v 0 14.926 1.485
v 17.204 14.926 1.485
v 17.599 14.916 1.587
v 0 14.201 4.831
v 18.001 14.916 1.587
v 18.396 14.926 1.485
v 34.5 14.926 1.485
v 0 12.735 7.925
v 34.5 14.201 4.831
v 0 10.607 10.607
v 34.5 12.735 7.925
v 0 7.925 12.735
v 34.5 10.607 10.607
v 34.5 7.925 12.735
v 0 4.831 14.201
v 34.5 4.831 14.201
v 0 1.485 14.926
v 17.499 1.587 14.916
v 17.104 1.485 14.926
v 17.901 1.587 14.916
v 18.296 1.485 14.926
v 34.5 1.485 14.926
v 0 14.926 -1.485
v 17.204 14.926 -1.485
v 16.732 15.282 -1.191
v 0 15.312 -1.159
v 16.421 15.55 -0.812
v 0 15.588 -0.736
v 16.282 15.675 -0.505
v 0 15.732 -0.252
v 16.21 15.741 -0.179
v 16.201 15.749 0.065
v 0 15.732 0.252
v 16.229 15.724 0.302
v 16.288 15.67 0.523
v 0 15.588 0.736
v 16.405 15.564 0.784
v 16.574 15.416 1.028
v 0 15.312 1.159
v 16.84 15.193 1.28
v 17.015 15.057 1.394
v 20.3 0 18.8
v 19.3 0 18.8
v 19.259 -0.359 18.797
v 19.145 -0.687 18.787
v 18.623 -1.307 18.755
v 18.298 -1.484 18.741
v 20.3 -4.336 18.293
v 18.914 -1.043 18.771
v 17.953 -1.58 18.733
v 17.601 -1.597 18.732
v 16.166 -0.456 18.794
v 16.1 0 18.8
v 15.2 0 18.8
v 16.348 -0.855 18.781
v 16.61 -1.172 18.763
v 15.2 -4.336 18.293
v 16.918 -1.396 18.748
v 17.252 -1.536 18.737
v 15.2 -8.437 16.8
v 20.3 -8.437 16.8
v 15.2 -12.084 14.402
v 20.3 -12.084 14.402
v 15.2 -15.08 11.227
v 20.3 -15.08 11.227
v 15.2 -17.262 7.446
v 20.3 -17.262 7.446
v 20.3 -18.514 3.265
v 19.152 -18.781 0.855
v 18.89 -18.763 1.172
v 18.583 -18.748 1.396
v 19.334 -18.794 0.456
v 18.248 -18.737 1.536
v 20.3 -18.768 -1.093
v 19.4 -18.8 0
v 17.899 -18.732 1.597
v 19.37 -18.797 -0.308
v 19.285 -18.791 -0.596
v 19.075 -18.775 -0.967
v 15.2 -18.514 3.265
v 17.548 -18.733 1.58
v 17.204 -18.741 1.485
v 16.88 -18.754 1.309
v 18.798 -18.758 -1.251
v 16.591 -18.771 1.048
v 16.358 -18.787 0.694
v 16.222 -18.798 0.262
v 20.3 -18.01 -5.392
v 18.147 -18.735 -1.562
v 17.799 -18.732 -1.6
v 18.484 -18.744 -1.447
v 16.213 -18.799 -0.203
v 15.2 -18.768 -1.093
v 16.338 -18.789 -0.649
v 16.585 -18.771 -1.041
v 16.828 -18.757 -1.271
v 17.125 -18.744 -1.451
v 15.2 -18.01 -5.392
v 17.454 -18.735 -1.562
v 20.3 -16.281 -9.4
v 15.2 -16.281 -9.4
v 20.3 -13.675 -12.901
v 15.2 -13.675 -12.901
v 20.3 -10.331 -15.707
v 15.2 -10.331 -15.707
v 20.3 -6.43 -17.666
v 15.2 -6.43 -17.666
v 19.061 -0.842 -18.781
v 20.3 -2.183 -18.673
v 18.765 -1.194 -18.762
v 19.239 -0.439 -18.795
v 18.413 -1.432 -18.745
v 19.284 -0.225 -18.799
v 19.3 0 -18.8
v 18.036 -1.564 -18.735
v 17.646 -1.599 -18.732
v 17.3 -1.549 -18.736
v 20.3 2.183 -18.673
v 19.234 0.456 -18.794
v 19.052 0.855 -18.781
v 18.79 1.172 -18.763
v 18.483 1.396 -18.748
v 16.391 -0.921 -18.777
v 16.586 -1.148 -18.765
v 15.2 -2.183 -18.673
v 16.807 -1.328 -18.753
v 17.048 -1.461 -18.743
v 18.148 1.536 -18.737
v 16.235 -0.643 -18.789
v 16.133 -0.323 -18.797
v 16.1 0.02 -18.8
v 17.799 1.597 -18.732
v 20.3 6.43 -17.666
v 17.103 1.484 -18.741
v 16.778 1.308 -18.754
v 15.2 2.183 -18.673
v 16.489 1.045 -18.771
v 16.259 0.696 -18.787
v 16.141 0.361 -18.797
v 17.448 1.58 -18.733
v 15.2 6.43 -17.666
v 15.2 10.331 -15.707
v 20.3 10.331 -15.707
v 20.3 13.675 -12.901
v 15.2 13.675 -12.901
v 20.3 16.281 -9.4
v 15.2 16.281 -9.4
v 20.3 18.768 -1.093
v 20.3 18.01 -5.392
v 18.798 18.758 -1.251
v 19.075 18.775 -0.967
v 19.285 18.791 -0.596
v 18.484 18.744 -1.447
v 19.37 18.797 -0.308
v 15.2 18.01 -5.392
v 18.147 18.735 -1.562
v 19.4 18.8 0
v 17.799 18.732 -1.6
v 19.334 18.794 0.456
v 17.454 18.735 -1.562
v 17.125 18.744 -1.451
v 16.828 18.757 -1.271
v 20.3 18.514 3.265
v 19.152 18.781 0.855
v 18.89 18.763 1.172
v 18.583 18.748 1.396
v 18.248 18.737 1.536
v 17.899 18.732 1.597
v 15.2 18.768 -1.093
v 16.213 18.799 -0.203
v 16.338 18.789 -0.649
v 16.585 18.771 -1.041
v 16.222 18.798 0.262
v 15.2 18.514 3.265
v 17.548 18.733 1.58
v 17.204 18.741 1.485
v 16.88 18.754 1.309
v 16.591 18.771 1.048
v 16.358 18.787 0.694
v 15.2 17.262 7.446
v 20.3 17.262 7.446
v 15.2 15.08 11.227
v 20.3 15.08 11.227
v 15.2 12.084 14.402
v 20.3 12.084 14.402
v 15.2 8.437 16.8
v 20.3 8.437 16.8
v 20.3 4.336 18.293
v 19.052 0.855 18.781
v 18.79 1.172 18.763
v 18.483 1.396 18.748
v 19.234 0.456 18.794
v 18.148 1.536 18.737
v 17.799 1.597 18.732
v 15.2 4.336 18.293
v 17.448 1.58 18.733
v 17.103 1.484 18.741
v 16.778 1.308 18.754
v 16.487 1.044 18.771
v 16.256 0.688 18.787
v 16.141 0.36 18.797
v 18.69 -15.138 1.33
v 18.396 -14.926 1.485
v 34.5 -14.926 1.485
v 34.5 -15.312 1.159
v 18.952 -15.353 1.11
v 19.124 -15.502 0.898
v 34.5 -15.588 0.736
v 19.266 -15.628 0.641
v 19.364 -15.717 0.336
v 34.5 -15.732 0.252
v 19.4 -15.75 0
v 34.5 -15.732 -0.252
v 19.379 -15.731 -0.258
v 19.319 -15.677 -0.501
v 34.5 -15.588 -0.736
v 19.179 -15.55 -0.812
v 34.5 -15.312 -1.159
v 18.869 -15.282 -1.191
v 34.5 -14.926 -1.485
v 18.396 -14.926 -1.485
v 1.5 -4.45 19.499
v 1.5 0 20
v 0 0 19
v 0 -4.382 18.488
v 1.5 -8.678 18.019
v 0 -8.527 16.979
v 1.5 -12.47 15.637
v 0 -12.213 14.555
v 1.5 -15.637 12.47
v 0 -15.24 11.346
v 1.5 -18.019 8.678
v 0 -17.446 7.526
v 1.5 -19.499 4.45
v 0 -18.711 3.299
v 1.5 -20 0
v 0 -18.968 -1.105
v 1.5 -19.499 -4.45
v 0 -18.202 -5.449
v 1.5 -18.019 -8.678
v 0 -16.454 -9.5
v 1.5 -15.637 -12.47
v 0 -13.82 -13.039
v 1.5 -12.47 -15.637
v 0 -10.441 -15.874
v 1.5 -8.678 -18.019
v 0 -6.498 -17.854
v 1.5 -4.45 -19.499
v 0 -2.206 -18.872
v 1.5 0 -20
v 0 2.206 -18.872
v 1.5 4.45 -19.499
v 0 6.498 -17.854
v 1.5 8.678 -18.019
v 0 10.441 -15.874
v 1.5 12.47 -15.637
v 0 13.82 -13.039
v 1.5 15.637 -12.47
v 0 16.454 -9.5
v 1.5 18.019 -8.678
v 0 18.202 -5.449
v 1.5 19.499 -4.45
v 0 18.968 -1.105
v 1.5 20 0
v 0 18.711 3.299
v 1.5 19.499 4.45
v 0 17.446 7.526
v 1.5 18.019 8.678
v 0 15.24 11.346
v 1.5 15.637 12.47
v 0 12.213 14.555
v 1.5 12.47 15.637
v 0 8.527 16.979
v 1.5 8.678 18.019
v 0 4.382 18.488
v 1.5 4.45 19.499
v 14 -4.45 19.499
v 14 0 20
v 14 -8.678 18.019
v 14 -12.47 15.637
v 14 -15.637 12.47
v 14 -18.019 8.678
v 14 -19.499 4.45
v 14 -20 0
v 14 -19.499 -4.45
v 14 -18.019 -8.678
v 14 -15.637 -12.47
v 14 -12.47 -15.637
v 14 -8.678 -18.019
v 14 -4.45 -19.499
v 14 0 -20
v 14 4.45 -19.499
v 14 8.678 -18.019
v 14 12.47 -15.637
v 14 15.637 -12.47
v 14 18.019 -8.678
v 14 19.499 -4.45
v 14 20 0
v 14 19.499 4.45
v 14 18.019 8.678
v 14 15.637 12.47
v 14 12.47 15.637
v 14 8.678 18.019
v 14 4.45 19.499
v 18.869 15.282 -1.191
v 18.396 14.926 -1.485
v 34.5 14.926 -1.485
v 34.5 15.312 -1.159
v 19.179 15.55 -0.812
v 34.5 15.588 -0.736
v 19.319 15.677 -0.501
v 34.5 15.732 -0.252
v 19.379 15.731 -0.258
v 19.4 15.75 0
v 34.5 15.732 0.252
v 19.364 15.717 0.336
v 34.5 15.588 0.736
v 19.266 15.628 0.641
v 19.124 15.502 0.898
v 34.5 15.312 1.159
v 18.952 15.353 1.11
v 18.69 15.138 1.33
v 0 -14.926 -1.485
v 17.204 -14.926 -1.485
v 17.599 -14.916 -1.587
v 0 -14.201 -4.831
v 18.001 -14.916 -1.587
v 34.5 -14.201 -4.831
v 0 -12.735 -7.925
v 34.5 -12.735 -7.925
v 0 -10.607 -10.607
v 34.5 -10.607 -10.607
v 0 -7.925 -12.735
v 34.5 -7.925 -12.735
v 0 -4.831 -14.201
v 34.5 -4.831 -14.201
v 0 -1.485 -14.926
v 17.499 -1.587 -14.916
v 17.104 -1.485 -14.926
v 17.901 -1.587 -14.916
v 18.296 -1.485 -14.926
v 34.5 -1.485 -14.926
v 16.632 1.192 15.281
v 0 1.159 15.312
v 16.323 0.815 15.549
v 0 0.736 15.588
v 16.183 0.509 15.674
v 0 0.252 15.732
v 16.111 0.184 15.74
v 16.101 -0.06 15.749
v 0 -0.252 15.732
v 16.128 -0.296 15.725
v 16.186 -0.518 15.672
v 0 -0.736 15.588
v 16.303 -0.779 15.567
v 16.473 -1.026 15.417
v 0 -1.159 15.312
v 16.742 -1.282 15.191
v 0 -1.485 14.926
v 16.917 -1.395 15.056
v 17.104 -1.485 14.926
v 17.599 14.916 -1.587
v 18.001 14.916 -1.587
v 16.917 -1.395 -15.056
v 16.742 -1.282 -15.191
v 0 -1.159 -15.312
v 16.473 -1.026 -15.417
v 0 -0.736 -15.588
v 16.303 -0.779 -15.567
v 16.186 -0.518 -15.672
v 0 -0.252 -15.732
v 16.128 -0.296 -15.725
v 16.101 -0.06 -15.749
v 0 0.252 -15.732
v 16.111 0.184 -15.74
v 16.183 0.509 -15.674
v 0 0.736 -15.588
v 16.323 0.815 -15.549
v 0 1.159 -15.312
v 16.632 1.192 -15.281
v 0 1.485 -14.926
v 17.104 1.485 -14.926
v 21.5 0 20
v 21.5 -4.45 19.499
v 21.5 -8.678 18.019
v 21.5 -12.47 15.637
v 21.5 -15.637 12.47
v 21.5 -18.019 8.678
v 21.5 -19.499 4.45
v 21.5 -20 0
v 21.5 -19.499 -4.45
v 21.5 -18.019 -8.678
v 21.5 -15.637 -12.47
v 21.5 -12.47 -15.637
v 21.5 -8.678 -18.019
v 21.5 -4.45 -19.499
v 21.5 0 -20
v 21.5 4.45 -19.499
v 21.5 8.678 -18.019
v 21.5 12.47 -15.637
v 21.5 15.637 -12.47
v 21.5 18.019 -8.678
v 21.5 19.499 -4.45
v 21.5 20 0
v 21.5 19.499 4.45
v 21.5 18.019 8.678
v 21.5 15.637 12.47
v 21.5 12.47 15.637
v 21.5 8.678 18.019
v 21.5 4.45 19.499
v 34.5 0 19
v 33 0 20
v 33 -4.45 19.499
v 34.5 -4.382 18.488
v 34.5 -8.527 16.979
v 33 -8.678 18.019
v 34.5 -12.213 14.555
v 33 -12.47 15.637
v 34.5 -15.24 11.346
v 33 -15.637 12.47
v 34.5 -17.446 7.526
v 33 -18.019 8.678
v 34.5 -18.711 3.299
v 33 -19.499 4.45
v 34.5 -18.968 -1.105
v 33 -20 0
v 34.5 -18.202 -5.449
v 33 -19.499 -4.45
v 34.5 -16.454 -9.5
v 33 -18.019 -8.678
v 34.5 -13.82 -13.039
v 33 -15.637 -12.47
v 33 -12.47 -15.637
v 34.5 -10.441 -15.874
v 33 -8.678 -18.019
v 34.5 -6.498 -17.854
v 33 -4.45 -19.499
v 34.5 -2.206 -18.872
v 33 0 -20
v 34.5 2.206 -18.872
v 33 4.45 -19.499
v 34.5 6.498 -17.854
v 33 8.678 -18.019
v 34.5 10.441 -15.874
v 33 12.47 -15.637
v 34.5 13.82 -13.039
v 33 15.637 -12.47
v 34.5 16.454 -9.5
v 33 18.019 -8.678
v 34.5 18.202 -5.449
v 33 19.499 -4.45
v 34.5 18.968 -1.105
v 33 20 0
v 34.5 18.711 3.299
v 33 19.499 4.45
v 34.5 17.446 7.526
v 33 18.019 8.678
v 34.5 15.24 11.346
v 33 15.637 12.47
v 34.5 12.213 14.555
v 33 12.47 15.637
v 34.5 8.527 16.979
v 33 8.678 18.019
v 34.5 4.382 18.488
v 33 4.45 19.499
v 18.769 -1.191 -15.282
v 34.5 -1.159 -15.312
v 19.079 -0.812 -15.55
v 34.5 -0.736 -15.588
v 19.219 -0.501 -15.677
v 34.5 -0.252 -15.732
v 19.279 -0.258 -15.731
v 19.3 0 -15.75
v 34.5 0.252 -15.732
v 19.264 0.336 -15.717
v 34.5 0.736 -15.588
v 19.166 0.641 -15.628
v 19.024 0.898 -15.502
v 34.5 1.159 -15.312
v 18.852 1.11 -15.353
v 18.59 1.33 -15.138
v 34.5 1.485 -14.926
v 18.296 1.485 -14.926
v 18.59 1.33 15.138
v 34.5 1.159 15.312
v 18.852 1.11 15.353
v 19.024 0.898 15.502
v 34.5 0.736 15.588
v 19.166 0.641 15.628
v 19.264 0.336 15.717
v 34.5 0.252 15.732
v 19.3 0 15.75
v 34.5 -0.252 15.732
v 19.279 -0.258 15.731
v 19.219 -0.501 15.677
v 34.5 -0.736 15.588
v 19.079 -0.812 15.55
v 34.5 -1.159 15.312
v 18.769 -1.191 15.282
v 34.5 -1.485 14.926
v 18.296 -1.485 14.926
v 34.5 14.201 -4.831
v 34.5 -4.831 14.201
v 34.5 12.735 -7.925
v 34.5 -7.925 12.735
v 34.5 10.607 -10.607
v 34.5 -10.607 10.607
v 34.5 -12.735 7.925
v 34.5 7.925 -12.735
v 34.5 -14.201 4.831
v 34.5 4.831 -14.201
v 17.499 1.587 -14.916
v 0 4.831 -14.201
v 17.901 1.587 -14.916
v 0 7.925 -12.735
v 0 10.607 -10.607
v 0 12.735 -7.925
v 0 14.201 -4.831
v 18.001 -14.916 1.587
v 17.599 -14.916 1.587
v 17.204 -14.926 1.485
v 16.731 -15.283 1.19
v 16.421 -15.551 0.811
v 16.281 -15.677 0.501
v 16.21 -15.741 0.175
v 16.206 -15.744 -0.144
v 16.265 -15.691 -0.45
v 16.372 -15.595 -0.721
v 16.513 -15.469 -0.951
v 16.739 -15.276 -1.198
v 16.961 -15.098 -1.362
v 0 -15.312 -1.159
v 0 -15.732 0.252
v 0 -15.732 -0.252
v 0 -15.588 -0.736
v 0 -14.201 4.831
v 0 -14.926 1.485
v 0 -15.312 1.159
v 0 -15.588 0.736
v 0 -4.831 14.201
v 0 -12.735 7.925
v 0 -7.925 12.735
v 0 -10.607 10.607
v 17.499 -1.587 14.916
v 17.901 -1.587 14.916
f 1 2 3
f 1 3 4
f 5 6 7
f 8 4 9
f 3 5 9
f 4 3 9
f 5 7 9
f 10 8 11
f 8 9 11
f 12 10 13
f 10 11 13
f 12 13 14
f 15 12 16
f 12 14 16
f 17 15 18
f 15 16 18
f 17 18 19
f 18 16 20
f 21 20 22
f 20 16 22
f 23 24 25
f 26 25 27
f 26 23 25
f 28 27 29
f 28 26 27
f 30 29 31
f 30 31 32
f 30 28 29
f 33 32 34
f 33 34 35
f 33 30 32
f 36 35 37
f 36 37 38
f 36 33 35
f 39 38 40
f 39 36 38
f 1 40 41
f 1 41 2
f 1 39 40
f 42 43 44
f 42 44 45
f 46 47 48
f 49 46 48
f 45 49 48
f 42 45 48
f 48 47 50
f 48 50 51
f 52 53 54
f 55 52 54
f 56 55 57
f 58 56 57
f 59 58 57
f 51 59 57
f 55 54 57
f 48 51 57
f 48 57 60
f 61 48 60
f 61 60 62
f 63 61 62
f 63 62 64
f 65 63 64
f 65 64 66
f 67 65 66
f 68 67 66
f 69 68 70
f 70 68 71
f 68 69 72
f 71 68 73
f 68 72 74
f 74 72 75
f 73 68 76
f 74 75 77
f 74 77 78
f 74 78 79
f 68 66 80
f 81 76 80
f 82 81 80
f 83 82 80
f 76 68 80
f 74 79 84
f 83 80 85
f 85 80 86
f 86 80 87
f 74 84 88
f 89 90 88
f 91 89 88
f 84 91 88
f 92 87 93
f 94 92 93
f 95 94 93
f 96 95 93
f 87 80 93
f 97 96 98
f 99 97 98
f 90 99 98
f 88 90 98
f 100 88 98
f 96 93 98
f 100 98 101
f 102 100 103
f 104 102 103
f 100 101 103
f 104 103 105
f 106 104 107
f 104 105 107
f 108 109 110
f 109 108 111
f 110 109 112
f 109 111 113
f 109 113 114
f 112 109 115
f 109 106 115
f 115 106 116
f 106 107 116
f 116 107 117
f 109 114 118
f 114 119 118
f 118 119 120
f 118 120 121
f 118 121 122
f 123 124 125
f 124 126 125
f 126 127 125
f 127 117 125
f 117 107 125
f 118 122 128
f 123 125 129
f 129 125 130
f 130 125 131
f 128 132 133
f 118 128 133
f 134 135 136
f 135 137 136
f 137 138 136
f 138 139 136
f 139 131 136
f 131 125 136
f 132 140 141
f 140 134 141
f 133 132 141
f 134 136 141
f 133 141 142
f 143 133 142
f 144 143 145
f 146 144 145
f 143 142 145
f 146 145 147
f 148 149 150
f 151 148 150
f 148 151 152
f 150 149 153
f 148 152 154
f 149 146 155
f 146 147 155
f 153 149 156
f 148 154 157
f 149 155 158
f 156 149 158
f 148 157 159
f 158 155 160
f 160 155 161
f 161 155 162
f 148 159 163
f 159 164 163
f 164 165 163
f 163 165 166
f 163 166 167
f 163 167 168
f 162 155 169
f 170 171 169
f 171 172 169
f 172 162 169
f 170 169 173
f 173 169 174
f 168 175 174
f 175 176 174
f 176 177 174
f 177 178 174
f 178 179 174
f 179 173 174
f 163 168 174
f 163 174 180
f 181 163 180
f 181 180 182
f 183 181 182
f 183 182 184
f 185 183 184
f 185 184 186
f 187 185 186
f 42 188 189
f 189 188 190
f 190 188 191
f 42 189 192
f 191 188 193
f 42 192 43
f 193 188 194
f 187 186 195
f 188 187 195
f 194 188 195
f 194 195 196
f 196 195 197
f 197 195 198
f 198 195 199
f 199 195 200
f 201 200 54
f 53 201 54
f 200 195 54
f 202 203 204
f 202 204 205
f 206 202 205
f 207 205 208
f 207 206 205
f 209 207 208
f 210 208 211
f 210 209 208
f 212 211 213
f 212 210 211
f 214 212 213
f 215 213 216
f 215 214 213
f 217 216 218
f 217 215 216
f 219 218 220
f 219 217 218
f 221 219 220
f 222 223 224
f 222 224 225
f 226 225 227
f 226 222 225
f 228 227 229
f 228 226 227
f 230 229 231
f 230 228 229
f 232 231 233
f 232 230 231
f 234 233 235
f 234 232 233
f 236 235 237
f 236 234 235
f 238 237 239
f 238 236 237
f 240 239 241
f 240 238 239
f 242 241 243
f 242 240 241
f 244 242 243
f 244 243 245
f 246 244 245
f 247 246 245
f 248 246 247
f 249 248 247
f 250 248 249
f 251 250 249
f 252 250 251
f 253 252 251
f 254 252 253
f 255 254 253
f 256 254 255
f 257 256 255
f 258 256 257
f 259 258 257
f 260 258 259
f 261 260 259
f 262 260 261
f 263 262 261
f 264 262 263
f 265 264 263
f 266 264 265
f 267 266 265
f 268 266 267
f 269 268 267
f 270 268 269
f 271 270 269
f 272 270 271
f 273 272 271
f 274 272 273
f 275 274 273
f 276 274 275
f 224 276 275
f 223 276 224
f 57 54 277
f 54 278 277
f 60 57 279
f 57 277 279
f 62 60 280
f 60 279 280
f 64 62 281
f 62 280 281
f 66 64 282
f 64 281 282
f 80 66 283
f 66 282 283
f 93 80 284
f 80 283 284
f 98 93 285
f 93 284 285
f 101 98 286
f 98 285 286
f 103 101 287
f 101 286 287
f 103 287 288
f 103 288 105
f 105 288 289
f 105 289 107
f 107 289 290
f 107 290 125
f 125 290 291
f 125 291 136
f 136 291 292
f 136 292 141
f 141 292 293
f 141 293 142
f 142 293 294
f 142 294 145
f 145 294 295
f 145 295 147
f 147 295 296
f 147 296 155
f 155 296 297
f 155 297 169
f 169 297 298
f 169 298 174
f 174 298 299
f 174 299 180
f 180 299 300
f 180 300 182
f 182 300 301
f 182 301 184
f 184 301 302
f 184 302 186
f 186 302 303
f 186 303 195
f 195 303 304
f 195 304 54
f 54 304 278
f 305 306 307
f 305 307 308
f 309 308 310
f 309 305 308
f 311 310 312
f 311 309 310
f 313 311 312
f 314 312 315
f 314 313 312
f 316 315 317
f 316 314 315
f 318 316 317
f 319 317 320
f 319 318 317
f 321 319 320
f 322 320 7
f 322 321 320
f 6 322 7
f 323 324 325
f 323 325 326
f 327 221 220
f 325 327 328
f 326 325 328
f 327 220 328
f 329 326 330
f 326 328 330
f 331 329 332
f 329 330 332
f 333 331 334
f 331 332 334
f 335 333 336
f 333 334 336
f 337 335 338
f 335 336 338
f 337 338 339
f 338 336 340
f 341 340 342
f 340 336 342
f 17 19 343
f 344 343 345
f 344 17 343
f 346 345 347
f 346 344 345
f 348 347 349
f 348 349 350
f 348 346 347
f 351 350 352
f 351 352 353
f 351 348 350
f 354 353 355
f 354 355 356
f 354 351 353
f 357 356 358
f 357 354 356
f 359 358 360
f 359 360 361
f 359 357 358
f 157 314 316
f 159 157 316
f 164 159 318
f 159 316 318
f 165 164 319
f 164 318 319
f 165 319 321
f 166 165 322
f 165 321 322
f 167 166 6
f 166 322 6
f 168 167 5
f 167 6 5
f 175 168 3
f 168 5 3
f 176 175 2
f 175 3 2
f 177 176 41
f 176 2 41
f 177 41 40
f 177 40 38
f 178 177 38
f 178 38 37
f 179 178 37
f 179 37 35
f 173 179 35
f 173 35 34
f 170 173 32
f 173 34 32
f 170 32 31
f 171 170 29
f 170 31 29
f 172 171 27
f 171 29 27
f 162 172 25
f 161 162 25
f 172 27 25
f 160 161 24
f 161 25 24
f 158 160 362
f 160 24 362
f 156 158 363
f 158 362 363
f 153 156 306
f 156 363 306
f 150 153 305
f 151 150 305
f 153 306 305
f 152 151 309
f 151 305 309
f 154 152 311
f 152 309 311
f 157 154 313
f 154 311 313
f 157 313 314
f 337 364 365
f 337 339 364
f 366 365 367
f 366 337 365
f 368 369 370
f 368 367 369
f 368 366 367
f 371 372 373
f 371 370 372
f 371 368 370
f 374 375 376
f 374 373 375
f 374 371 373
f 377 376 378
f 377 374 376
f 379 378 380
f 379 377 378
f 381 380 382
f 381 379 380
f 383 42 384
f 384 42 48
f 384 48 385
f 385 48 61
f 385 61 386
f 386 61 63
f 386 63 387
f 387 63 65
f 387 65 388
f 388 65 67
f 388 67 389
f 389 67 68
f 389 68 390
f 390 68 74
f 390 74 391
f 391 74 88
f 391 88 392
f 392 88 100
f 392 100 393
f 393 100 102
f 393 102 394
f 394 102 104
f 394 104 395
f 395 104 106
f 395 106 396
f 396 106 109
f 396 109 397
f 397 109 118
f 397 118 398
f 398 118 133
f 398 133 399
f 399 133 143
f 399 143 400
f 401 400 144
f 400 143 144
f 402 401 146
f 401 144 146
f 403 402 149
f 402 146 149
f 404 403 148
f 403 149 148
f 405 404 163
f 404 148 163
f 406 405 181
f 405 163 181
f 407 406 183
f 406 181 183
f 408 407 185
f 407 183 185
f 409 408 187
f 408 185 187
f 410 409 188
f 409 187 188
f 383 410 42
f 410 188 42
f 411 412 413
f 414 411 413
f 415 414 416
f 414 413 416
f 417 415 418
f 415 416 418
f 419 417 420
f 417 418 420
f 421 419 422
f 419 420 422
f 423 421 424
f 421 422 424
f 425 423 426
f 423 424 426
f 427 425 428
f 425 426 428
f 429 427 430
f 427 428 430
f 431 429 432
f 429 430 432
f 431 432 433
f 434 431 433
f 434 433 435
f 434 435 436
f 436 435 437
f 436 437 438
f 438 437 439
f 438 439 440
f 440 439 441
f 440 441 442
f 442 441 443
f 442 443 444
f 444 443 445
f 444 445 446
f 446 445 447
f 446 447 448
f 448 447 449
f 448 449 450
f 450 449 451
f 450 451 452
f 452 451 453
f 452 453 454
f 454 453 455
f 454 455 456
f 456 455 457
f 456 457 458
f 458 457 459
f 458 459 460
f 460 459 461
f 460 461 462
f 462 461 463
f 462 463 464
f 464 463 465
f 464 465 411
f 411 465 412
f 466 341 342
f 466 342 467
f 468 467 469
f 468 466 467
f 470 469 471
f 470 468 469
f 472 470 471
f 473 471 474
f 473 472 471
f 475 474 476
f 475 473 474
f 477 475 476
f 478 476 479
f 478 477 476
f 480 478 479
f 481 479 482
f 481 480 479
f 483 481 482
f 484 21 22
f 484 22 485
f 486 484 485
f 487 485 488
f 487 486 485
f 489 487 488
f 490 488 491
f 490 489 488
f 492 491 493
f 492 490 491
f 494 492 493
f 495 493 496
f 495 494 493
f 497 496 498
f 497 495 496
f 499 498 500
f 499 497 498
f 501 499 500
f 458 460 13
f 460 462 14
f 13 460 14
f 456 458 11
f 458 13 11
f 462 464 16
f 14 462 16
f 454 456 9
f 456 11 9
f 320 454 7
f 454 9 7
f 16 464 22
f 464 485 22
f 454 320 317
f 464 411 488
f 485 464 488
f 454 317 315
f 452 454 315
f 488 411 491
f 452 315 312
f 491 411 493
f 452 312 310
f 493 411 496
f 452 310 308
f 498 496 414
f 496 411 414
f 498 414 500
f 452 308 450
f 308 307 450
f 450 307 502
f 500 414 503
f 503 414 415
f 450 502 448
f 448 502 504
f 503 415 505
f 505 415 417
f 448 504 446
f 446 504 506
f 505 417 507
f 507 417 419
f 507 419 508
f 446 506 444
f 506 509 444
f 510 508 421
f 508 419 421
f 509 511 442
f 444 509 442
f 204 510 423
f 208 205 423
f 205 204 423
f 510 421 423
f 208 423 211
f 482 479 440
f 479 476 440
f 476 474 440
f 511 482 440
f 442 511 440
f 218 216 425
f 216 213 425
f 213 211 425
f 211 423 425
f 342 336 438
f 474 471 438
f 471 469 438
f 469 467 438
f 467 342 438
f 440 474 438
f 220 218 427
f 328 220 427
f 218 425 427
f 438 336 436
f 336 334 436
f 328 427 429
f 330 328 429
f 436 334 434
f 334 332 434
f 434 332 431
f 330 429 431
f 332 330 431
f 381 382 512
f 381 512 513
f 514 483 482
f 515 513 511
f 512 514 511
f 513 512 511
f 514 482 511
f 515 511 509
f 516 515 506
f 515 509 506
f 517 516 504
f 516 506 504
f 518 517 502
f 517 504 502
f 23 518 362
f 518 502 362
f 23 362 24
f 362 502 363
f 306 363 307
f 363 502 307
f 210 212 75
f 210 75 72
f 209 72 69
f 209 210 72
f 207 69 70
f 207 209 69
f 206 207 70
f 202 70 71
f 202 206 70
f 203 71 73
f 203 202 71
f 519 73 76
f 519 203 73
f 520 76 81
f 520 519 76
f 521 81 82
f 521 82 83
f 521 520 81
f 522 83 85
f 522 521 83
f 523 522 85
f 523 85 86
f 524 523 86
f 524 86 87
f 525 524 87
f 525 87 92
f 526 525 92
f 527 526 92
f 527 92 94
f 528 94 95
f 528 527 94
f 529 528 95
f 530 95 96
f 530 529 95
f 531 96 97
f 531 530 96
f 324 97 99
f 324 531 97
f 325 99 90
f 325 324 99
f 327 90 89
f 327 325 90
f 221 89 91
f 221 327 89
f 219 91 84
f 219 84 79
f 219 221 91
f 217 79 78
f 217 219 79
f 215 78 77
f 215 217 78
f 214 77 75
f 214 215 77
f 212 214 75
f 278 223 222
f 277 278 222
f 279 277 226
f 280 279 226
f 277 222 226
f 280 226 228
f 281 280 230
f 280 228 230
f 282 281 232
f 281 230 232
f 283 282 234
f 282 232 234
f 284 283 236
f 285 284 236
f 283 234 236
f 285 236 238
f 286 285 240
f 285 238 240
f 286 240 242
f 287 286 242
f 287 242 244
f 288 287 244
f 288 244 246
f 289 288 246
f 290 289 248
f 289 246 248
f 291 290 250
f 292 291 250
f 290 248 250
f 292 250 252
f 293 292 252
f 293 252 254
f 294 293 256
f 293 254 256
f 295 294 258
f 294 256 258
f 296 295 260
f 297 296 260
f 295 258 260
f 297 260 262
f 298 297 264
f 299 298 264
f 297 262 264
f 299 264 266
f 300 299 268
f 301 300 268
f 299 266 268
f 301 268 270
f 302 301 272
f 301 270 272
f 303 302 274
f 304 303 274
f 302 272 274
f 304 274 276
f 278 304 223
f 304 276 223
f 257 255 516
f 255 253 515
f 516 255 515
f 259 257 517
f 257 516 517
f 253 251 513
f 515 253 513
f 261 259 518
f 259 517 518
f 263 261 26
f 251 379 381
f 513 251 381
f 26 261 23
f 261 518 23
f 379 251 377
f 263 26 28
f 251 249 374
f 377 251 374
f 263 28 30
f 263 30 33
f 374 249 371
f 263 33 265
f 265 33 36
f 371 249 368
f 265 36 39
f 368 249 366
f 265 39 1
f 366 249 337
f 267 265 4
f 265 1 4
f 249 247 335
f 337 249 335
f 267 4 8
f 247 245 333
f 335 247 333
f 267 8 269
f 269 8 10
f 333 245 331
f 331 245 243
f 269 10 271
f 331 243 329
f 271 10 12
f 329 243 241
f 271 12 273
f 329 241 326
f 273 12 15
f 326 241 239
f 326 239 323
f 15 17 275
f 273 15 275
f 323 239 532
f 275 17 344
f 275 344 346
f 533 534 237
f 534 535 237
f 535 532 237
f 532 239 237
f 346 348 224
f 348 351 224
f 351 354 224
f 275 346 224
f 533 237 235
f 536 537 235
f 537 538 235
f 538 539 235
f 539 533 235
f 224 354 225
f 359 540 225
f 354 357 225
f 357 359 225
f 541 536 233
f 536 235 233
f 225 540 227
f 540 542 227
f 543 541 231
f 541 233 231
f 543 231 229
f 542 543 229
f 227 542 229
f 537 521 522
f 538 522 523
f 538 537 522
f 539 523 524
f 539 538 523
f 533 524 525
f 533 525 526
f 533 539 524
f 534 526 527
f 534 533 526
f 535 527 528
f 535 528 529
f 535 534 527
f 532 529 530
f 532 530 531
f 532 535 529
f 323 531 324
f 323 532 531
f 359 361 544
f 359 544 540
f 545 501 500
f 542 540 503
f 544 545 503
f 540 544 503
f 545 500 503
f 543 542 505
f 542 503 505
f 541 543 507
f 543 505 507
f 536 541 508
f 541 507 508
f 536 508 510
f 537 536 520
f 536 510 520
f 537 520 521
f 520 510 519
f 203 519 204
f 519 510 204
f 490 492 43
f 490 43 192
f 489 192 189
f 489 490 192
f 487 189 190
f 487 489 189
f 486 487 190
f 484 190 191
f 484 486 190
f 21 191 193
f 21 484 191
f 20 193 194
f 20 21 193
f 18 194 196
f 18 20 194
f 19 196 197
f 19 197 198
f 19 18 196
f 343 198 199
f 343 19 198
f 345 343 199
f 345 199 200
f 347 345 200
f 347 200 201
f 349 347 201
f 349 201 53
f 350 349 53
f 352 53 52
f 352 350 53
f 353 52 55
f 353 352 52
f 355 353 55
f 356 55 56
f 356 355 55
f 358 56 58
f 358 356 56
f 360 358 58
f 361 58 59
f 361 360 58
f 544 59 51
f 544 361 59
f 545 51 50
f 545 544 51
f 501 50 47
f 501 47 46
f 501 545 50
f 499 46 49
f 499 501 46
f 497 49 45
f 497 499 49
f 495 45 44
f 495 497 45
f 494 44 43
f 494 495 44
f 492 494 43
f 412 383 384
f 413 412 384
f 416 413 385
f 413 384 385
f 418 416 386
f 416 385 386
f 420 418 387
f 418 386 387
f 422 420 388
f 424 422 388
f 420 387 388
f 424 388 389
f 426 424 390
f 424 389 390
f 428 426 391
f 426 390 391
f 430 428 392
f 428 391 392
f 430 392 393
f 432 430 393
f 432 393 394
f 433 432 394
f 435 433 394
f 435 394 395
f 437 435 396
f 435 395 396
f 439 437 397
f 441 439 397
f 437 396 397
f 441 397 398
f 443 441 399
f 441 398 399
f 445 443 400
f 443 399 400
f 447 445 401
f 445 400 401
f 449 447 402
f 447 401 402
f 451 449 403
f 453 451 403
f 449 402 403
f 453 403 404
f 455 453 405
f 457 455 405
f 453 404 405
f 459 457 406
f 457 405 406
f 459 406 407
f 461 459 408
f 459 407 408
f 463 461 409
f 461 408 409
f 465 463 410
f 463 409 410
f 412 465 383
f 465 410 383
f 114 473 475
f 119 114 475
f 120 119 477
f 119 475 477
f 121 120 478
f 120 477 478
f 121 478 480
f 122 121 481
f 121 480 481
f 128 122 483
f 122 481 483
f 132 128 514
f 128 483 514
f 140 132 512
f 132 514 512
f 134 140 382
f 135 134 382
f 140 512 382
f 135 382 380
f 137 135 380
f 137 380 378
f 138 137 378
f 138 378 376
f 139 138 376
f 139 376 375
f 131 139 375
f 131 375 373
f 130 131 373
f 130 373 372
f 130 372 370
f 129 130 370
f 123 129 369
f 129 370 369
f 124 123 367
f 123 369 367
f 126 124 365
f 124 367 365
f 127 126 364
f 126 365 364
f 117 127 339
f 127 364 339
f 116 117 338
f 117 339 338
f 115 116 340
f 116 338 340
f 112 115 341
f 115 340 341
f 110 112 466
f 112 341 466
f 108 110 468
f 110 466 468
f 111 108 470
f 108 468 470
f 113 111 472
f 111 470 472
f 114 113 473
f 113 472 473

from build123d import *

# Parameters (mm, degrees)
F2_R          = 1.75
F3_DEPTH      = 34.501
F4_R          = 1.6
F5_DEPTH      = 20.001
F5_DEPTH_BACK = 20.001
F6_R          = 1.6
F7_DEPTH      = 20.001
F7_DEPTH_BACK = 20.001
F8_C1_SIZE2   = 1.5
F8_C1_SIZE    = 1
F8_C2_SIZE2   = 1.5
F8_C2_SIZE    = 1


# Not quite as in the source:
# - two fillets or chamfers of one size are made in one step


with BuildPart() as f1:
    # F0 (on Front) → F1 (revolve)
    with BuildSketch(Plane.XZ):
        Polygon((0, 20), (0, 15), (34.5, 15), (34.5, 20), (21.5, 20), (20.3, 18.8), (15.2, 18.8), (14, 20), align=None)
    revolve(axis=Axis((0.4285710554, 0, 0), (1, 0, 0)))

    # F2 (on Right) → F3 (cut, through all)
    with BuildSketch(Plane.YZ):
        with Locations((14, 0)):
            Circle(F2_R)
        with Locations((0, 14)):
            Circle(F2_R)
        with Locations((-14, 0)):
            Circle(F2_R)
        with Locations((0, -14)):
            Circle(F2_R)
    extrude(amount=F3_DEPTH, mode=Mode.SUBTRACT)

    # F4 (on Top) → F5 (cut, two sides)
    with BuildSketch(Plane.XY) as f5_sk:
        with Locations((17.7, 0)):
            Circle(F4_R)
    extrude(amount=-F5_DEPTH, mode=Mode.SUBTRACT)
    extrude(f5_sk.sketch, amount=F5_DEPTH_BACK, mode=Mode.SUBTRACT)

    # F6 (on Front) → F7 (cut, two sides)
    with BuildSketch(Plane.XZ) as f7_sk:
        with Locations((17.8, 0)):
            Circle(F6_R)
    extrude(amount=-F7_DEPTH, mode=Mode.SUBTRACT)
    extrude(f7_sk.sketch, amount=F7_DEPTH_BACK, mode=Mode.SUBTRACT)

    # F8: chamfer of 1.5 x 1 on 2 edges, made by hand

    # F8_c1
    f8_c1_edges = [f1.edges().sort_by_distance(p)[0] for p in [
        (0, 0, -20),
    ]]
    f8_c1_side = f1.faces().sort_by_distance((0, 0, -19.98))[0]
    chamfer(f8_c1_edges, length=F8_C1_SIZE, length2=F8_C1_SIZE2, reference=f8_c1_side)

    # F8_c2
    f8_c2_edges = [f1.edges().sort_by_distance(p)[0] for p in [
        (34.5, 0, -20),
    ]]
    f8_c2_side = f1.faces().sort_by_distance((34.5, 0, -19.98))[0]
    chamfer(f8_c2_edges, length=F8_C2_SIZE, length2=F8_C2_SIZE2, reference=f8_c2_side)


solid = f1.part
